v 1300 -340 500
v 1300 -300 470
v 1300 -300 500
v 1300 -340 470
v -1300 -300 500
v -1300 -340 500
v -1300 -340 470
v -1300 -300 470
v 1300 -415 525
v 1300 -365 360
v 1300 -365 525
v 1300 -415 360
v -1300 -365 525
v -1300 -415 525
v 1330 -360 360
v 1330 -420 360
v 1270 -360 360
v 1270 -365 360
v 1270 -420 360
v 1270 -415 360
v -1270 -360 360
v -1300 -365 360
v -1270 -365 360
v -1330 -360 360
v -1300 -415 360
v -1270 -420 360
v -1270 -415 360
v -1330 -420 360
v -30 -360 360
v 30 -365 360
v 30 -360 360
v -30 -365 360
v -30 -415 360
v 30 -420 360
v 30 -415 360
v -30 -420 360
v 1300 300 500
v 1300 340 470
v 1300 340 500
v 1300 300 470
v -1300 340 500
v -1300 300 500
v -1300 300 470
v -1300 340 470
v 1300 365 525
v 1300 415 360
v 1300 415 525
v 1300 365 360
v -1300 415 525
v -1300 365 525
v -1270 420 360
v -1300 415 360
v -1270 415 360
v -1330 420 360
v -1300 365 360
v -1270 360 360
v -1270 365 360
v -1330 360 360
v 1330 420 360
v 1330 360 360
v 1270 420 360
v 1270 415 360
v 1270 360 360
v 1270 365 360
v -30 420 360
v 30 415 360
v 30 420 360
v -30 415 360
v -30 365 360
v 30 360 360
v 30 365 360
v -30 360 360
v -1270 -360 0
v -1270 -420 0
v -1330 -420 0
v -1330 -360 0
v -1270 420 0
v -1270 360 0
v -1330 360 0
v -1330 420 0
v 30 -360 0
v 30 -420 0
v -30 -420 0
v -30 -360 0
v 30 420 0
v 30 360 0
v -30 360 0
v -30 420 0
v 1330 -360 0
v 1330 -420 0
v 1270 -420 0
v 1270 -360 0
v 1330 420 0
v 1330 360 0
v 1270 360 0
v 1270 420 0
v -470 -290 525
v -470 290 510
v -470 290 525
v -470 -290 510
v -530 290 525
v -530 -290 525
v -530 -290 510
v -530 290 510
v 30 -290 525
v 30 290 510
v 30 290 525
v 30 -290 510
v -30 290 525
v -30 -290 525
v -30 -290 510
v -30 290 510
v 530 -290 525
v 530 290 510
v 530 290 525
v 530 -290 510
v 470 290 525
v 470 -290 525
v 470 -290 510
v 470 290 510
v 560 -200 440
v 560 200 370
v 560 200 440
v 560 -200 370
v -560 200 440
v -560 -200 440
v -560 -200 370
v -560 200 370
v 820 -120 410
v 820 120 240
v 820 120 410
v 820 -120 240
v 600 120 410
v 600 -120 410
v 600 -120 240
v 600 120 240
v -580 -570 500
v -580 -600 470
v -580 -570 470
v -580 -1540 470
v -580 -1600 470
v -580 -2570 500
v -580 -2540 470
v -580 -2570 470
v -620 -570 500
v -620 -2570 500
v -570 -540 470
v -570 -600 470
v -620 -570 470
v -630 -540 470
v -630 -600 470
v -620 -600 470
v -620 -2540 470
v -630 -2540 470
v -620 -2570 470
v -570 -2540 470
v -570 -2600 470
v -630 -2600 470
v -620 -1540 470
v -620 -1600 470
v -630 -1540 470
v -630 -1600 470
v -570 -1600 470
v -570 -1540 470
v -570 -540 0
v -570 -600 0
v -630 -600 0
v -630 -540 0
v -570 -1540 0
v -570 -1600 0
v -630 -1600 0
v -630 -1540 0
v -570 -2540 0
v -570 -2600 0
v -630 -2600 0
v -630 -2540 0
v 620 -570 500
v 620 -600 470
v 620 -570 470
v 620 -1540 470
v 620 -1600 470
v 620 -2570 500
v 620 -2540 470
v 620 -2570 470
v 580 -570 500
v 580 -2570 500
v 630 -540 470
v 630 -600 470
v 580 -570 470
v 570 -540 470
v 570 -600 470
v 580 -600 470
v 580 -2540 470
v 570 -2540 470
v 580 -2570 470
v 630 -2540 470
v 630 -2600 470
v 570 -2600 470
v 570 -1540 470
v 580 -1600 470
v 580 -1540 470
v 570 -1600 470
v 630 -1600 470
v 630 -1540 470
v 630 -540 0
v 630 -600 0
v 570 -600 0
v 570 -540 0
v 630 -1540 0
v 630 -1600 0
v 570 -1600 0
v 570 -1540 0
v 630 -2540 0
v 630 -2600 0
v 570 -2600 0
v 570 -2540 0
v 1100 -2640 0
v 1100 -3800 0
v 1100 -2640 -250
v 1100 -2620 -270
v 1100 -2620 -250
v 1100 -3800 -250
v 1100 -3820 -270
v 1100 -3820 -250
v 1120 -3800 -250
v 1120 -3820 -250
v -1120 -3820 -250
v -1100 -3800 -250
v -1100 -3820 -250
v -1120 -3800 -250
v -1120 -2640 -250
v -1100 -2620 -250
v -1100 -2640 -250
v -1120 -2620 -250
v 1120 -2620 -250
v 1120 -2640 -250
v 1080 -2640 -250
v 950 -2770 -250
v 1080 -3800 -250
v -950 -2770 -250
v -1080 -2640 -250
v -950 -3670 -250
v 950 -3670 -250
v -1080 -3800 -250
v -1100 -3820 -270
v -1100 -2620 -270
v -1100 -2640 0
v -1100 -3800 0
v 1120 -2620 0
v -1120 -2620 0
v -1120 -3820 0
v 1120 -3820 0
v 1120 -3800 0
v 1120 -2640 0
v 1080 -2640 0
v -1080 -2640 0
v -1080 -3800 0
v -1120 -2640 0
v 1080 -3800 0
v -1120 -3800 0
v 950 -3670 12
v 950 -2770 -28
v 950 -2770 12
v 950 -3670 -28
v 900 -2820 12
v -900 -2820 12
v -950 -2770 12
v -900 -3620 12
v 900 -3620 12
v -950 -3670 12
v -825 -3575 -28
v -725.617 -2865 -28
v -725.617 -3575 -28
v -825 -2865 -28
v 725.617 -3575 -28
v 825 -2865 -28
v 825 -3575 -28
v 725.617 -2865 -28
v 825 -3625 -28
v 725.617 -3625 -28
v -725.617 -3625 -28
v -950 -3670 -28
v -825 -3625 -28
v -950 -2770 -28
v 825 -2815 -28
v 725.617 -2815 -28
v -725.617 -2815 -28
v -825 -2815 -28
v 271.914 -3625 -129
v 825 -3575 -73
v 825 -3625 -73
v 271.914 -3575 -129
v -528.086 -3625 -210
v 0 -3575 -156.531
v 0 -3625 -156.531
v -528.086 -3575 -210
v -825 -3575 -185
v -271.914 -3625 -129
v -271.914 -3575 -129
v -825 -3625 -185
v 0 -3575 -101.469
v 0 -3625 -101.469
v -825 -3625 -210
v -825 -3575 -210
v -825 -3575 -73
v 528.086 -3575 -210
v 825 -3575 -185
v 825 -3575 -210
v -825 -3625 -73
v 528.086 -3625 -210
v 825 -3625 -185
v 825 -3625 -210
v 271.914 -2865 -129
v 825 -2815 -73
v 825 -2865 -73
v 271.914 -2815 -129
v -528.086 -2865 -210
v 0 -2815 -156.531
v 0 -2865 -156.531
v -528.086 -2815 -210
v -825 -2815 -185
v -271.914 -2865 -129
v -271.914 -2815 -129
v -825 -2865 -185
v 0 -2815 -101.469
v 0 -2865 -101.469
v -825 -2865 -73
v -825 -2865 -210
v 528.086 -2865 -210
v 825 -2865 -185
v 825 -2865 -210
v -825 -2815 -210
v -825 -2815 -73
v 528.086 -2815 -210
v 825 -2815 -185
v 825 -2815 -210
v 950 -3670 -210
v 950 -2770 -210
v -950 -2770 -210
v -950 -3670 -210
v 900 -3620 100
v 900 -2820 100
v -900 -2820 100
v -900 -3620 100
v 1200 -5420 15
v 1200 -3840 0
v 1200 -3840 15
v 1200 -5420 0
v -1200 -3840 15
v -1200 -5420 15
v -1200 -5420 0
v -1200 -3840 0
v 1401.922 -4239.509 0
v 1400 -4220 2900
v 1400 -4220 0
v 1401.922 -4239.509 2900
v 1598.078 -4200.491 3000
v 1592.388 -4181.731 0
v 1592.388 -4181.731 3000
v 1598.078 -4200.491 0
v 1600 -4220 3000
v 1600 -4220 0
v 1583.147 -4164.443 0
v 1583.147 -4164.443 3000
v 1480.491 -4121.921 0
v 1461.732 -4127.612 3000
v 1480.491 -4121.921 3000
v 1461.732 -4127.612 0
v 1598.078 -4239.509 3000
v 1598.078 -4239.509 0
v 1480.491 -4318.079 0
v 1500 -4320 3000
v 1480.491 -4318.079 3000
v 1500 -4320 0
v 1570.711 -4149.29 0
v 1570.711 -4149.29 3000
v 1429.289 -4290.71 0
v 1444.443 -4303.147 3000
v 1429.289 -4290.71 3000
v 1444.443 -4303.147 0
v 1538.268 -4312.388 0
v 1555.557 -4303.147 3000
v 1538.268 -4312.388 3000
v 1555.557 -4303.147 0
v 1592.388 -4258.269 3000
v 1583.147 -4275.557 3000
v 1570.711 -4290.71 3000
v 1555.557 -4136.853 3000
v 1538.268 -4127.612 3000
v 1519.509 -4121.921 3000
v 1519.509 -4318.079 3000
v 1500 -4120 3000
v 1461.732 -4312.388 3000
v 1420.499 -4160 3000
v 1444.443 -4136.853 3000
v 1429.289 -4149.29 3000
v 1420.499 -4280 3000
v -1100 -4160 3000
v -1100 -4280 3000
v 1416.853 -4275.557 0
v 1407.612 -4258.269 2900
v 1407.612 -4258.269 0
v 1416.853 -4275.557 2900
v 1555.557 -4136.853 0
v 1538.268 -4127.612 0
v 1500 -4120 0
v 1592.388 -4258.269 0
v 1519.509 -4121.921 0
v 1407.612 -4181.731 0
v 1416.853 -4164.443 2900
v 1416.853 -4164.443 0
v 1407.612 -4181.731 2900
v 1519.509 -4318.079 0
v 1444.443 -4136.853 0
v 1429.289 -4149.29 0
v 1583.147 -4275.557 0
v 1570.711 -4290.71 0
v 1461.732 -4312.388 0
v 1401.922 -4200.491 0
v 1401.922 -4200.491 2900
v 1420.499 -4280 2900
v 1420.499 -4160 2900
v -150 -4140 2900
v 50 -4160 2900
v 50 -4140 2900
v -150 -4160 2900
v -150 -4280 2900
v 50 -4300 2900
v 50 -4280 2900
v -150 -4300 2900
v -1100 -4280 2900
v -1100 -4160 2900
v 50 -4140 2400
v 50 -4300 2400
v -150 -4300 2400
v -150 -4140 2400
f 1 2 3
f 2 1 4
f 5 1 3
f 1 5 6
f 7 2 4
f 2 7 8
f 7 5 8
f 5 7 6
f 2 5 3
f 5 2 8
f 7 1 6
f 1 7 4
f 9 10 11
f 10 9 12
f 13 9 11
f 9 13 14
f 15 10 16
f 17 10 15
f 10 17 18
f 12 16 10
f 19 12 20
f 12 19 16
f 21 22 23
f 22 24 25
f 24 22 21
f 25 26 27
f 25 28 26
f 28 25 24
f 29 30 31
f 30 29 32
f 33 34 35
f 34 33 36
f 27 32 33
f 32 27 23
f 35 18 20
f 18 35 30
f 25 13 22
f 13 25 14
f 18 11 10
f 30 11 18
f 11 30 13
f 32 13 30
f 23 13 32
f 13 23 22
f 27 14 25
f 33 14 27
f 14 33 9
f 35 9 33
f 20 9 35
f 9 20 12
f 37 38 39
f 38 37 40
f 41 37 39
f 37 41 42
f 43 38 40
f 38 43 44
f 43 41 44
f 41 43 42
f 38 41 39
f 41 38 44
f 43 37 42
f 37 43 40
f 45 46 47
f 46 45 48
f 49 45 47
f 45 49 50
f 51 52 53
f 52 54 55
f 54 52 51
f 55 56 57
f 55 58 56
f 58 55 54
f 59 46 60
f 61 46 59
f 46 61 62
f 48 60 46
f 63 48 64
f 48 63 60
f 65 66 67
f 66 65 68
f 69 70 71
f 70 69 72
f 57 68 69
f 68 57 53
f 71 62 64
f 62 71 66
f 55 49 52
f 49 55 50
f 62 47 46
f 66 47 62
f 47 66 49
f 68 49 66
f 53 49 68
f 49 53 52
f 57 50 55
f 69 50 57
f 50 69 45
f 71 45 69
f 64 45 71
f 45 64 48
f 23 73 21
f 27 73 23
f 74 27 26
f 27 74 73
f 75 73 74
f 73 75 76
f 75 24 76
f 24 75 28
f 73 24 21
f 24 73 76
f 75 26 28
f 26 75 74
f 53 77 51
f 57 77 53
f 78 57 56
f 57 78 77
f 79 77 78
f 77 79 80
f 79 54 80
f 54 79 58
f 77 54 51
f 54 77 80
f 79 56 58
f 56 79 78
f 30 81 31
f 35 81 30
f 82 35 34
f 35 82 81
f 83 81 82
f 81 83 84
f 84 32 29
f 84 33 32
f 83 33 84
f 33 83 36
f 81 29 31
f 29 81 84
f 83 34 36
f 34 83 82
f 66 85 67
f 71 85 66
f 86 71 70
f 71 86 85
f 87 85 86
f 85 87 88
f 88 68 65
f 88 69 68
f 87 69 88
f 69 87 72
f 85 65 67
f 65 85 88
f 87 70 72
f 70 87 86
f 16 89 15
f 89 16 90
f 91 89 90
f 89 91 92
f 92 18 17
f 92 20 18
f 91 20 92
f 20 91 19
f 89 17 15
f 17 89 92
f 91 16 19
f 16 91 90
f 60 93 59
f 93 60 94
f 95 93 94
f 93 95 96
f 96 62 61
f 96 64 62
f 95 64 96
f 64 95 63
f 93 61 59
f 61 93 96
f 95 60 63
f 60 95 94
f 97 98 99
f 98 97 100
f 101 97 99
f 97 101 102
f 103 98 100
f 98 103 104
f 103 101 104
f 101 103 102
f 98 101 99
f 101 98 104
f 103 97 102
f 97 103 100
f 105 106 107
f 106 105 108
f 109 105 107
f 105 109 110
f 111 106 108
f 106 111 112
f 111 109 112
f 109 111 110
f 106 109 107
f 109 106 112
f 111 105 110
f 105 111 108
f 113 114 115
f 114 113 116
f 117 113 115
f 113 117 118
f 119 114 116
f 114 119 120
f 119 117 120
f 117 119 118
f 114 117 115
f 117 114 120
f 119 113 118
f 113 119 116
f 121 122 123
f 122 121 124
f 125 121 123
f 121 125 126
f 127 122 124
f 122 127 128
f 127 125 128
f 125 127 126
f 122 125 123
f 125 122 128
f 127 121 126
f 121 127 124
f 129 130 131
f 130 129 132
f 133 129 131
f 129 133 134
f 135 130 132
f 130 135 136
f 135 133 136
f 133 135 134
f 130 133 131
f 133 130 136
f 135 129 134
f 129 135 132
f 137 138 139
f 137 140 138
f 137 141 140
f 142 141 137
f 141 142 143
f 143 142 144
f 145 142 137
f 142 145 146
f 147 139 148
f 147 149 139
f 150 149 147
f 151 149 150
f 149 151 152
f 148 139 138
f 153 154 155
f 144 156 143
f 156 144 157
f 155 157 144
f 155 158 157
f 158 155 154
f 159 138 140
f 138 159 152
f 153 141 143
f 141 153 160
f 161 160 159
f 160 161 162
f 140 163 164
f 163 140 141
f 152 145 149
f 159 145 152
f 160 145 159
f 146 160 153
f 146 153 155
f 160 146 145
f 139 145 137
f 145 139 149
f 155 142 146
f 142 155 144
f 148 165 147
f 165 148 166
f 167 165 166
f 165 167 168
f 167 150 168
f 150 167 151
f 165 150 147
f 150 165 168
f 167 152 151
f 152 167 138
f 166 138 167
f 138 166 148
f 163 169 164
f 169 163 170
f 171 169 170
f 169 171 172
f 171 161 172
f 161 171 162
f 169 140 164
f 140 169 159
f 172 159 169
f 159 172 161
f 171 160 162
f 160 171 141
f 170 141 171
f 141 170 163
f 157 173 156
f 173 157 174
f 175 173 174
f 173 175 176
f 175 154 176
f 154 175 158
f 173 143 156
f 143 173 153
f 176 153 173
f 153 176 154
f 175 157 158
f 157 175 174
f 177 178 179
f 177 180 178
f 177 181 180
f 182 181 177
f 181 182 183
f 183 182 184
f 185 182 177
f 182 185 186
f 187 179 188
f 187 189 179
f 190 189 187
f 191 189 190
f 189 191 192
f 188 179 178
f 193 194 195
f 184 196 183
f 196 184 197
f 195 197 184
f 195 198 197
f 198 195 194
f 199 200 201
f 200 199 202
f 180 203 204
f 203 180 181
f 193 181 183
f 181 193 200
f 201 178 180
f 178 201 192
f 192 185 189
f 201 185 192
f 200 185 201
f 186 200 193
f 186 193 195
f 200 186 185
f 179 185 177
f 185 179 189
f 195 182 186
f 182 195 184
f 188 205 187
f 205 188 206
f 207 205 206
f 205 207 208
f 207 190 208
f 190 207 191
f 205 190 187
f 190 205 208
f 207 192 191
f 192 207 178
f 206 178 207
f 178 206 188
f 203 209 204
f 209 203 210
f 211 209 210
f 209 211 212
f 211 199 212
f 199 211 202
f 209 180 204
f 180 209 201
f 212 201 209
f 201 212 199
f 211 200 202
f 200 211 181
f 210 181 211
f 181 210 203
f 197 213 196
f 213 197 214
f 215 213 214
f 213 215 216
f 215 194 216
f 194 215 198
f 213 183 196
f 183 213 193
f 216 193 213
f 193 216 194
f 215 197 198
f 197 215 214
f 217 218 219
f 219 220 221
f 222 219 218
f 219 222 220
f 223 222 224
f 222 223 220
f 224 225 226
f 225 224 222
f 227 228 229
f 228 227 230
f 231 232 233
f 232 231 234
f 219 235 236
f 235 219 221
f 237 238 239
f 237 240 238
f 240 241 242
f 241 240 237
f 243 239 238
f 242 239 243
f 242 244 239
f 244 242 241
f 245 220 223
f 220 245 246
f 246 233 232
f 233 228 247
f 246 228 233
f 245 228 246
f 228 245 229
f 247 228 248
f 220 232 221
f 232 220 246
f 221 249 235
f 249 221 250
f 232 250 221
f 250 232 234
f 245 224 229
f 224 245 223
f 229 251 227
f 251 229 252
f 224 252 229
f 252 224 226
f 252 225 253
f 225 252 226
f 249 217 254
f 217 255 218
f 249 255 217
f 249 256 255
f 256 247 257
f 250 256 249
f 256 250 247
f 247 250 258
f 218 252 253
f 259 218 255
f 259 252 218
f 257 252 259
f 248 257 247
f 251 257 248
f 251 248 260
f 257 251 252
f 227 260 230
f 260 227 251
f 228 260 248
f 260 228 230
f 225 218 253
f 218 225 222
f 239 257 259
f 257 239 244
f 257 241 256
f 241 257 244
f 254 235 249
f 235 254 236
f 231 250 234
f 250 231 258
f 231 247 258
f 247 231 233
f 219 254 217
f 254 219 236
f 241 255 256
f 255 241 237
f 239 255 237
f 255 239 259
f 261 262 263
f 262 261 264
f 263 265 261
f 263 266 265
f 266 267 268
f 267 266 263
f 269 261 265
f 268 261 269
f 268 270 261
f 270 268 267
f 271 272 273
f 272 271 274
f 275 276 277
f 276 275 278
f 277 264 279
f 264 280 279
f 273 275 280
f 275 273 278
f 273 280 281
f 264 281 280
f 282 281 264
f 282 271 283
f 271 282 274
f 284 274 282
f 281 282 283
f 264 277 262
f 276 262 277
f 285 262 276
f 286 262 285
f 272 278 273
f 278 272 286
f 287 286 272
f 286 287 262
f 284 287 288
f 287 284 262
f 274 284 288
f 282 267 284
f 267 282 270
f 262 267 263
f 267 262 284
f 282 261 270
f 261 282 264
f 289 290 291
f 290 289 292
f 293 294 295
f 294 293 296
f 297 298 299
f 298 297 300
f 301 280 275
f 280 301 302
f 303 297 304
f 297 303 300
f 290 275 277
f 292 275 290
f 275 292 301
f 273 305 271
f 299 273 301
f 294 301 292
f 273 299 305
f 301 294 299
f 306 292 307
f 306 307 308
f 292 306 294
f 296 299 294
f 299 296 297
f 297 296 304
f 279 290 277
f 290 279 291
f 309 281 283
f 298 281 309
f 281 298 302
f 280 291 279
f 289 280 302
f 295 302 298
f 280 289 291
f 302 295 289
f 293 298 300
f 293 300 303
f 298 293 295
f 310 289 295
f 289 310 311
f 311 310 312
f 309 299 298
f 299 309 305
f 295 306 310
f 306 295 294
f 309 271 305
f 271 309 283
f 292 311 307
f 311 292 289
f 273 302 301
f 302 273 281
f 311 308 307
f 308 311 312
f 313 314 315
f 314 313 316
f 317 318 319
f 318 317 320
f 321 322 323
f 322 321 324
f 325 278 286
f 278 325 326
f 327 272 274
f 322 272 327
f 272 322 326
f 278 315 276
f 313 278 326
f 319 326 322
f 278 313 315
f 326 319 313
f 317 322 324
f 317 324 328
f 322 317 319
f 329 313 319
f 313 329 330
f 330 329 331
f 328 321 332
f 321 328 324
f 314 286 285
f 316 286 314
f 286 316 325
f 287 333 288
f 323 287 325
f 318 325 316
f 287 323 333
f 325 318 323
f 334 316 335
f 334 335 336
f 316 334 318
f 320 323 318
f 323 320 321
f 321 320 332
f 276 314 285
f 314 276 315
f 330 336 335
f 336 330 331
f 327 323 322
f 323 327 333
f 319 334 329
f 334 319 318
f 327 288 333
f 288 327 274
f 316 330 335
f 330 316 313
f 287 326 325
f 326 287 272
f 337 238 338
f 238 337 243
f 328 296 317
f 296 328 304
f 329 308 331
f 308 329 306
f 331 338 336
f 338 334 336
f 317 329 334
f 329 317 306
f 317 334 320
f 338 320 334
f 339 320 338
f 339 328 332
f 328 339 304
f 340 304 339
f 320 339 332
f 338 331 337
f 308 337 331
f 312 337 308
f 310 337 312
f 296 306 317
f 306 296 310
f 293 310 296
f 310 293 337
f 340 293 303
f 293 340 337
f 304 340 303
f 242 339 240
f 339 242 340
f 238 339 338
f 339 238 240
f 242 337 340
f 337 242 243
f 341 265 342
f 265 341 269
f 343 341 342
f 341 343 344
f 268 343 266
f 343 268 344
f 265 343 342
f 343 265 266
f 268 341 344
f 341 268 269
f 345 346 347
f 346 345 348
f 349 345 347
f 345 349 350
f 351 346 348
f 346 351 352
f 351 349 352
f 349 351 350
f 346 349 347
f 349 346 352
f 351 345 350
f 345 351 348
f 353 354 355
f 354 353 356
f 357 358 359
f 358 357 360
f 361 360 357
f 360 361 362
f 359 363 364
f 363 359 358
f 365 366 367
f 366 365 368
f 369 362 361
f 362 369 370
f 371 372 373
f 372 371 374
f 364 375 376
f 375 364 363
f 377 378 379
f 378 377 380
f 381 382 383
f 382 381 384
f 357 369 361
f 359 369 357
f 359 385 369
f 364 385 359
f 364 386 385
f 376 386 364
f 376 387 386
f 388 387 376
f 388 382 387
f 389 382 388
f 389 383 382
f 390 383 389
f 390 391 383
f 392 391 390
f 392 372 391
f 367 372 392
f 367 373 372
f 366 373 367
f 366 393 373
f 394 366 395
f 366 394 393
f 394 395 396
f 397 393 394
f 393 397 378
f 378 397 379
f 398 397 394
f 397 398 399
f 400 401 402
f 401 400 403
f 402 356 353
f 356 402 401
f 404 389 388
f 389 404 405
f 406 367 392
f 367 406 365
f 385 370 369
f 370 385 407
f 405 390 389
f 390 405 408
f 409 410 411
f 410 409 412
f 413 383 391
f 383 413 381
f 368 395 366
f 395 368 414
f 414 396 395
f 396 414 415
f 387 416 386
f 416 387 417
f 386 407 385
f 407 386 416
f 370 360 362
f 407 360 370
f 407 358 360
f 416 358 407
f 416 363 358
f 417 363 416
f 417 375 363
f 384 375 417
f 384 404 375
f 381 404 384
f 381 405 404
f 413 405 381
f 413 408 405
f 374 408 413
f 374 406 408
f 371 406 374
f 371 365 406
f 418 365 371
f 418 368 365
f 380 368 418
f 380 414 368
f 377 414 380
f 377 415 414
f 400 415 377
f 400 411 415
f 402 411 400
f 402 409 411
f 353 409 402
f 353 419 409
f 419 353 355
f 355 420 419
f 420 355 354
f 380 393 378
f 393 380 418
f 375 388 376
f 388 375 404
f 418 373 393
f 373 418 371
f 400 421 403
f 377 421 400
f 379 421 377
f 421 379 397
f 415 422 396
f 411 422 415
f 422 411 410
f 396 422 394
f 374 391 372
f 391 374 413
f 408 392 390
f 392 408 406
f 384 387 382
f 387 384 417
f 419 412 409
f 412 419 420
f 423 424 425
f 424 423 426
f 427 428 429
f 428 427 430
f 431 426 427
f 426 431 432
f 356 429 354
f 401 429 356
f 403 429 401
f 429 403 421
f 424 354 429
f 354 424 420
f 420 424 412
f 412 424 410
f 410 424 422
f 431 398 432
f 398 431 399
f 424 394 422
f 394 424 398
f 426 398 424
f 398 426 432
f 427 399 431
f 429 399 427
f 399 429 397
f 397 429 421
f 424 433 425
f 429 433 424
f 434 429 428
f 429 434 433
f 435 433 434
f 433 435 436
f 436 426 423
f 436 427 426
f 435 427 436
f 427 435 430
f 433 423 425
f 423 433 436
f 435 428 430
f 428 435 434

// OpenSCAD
// assy_spur_low - generated by asm_3d.py from out/assembly/assembly_specs.json (F4.4) - units mm
// DESIGN - check and release before manufacture. z up, conveyor top z = 500.

module assy_spur_low() {
  translate([-1300.00, -340.00, 470.00]) cube([2600.00, 40.00, 30.00]);
  translate([-1300.00, -415.00, 360.00]) cube([2600.00, 50.00, 165.00]);
  translate([-1300.00, 300.00, 470.00]) cube([2600.00, 40.00, 30.00]);
  translate([-1300.00, 365.00, 360.00]) cube([2600.00, 50.00, 165.00]);
  translate([-1330.00, -420.00, 0.00]) cube([60.00, 60.00, 360.00]);
  translate([-1330.00, 360.00, 0.00]) cube([60.00, 60.00, 360.00]);
  translate([-30.00, -420.00, 0.00]) cube([60.00, 60.00, 360.00]);
  translate([-30.00, 360.00, 0.00]) cube([60.00, 60.00, 360.00]);
  translate([1270.00, -420.00, 0.00]) cube([60.00, 60.00, 360.00]);
  translate([1270.00, 360.00, 0.00]) cube([60.00, 60.00, 360.00]);
  translate([-530.00, -290.00, 510.00]) cube([60.00, 580.00, 15.00]);
  translate([-30.00, -290.00, 510.00]) cube([60.00, 580.00, 15.00]);
  translate([470.00, -290.00, 510.00]) cube([60.00, 580.00, 15.00]);
  translate([-560.00, -200.00, 370.00]) cube([1120.00, 400.00, 70.00]);
  translate([600.00, -120.00, 240.00]) cube([220.00, 240.00, 170.00]);
  translate([-620.00, -2570.00, 470.00]) cube([40.00, 2000.00, 30.00]);
  translate([-630.00, -600.00, 0.00]) cube([60.00, 60.00, 470.00]);
  translate([-630.00, -1600.00, 0.00]) cube([60.00, 60.00, 470.00]);
  translate([-630.00, -2600.00, 0.00]) cube([60.00, 60.00, 470.00]);
  translate([580.00, -2570.00, 470.00]) cube([40.00, 2000.00, 30.00]);
  translate([570.00, -600.00, 0.00]) cube([60.00, 60.00, 470.00]);
  translate([570.00, -1600.00, 0.00]) cube([60.00, 60.00, 470.00]);
  translate([570.00, -2600.00, 0.00]) cube([60.00, 60.00, 470.00]);
  translate([-1100.00, -3820.00, -270.00]) cube([2200.00, 1200.00, 20.00]);
  translate([-1120.00, -3820.00, -250.00]) cube([2240.00, 20.00, 250.00]);
  translate([-1100.00, -3820.00, -250.00]) cube([20.00, 1200.00, 250.00]);
  translate([-1120.00, -2640.00, -250.00]) cube([2240.00, 20.00, 250.00]);
  translate([1080.00, -3820.00, -250.00]) cube([20.00, 1200.00, 250.00]);
  translate([-950.00, -3670.00, -28.00]) cube([1900.00, 900.00, 40.00]);
  hull() { translate([-800.00, -3600.00, -210.00]) cube([50.00, 50.00, 50.00], center = true); translate([800.00, -3600.00, -48.00]) cube([50.00, 50.00, 50.00], center = true); }
  hull() { translate([800.00, -3600.00, -210.00]) cube([50.00, 50.00, 50.00], center = true); translate([-800.00, -3600.00, -48.00]) cube([50.00, 50.00, 50.00], center = true); }
  hull() { translate([-800.00, -2840.00, -210.00]) cube([50.00, 50.00, 50.00], center = true); translate([800.00, -2840.00, -48.00]) cube([50.00, 50.00, 50.00], center = true); }
  hull() { translate([800.00, -2840.00, -210.00]) cube([50.00, 50.00, 50.00], center = true); translate([-800.00, -2840.00, -48.00]) cube([50.00, 50.00, 50.00], center = true); }
  translate([-950.00, -3670.00, -250.00]) cube([1900.00, 900.00, 40.00]);
  translate([-700.00, -3220.00, 32.00]) rotate([0, 0, 0]) cylinder(r = 15.00, h = 40.00, center = true, $fn = 32);
  translate([700.00, -3220.00, 32.00]) rotate([0, 0, 0]) cylinder(r = 15.00, h = 40.00, center = true, $fn = 32);
  translate([-900.00, -3620.00, 12.00]) cube([1800.00, 800.00, 88.00]);
  translate([-1200.00, -5420.00, 0.00]) cube([2400.00, 1580.00, 15.00]);
  translate([1500.00, -4220.00, 1500.00]) rotate([0, 0, 0]) cylinder(r = 100.00, h = 3000.00, center = true, $fn = 32);
  translate([-1100.00, -4280.00, 2900.00]) cube([2600.00, 120.00, 100.00]);
  translate([-150.00, -4300.00, 2400.00]) cube([200.00, 160.00, 500.00]);
}
assy_spur_low();
